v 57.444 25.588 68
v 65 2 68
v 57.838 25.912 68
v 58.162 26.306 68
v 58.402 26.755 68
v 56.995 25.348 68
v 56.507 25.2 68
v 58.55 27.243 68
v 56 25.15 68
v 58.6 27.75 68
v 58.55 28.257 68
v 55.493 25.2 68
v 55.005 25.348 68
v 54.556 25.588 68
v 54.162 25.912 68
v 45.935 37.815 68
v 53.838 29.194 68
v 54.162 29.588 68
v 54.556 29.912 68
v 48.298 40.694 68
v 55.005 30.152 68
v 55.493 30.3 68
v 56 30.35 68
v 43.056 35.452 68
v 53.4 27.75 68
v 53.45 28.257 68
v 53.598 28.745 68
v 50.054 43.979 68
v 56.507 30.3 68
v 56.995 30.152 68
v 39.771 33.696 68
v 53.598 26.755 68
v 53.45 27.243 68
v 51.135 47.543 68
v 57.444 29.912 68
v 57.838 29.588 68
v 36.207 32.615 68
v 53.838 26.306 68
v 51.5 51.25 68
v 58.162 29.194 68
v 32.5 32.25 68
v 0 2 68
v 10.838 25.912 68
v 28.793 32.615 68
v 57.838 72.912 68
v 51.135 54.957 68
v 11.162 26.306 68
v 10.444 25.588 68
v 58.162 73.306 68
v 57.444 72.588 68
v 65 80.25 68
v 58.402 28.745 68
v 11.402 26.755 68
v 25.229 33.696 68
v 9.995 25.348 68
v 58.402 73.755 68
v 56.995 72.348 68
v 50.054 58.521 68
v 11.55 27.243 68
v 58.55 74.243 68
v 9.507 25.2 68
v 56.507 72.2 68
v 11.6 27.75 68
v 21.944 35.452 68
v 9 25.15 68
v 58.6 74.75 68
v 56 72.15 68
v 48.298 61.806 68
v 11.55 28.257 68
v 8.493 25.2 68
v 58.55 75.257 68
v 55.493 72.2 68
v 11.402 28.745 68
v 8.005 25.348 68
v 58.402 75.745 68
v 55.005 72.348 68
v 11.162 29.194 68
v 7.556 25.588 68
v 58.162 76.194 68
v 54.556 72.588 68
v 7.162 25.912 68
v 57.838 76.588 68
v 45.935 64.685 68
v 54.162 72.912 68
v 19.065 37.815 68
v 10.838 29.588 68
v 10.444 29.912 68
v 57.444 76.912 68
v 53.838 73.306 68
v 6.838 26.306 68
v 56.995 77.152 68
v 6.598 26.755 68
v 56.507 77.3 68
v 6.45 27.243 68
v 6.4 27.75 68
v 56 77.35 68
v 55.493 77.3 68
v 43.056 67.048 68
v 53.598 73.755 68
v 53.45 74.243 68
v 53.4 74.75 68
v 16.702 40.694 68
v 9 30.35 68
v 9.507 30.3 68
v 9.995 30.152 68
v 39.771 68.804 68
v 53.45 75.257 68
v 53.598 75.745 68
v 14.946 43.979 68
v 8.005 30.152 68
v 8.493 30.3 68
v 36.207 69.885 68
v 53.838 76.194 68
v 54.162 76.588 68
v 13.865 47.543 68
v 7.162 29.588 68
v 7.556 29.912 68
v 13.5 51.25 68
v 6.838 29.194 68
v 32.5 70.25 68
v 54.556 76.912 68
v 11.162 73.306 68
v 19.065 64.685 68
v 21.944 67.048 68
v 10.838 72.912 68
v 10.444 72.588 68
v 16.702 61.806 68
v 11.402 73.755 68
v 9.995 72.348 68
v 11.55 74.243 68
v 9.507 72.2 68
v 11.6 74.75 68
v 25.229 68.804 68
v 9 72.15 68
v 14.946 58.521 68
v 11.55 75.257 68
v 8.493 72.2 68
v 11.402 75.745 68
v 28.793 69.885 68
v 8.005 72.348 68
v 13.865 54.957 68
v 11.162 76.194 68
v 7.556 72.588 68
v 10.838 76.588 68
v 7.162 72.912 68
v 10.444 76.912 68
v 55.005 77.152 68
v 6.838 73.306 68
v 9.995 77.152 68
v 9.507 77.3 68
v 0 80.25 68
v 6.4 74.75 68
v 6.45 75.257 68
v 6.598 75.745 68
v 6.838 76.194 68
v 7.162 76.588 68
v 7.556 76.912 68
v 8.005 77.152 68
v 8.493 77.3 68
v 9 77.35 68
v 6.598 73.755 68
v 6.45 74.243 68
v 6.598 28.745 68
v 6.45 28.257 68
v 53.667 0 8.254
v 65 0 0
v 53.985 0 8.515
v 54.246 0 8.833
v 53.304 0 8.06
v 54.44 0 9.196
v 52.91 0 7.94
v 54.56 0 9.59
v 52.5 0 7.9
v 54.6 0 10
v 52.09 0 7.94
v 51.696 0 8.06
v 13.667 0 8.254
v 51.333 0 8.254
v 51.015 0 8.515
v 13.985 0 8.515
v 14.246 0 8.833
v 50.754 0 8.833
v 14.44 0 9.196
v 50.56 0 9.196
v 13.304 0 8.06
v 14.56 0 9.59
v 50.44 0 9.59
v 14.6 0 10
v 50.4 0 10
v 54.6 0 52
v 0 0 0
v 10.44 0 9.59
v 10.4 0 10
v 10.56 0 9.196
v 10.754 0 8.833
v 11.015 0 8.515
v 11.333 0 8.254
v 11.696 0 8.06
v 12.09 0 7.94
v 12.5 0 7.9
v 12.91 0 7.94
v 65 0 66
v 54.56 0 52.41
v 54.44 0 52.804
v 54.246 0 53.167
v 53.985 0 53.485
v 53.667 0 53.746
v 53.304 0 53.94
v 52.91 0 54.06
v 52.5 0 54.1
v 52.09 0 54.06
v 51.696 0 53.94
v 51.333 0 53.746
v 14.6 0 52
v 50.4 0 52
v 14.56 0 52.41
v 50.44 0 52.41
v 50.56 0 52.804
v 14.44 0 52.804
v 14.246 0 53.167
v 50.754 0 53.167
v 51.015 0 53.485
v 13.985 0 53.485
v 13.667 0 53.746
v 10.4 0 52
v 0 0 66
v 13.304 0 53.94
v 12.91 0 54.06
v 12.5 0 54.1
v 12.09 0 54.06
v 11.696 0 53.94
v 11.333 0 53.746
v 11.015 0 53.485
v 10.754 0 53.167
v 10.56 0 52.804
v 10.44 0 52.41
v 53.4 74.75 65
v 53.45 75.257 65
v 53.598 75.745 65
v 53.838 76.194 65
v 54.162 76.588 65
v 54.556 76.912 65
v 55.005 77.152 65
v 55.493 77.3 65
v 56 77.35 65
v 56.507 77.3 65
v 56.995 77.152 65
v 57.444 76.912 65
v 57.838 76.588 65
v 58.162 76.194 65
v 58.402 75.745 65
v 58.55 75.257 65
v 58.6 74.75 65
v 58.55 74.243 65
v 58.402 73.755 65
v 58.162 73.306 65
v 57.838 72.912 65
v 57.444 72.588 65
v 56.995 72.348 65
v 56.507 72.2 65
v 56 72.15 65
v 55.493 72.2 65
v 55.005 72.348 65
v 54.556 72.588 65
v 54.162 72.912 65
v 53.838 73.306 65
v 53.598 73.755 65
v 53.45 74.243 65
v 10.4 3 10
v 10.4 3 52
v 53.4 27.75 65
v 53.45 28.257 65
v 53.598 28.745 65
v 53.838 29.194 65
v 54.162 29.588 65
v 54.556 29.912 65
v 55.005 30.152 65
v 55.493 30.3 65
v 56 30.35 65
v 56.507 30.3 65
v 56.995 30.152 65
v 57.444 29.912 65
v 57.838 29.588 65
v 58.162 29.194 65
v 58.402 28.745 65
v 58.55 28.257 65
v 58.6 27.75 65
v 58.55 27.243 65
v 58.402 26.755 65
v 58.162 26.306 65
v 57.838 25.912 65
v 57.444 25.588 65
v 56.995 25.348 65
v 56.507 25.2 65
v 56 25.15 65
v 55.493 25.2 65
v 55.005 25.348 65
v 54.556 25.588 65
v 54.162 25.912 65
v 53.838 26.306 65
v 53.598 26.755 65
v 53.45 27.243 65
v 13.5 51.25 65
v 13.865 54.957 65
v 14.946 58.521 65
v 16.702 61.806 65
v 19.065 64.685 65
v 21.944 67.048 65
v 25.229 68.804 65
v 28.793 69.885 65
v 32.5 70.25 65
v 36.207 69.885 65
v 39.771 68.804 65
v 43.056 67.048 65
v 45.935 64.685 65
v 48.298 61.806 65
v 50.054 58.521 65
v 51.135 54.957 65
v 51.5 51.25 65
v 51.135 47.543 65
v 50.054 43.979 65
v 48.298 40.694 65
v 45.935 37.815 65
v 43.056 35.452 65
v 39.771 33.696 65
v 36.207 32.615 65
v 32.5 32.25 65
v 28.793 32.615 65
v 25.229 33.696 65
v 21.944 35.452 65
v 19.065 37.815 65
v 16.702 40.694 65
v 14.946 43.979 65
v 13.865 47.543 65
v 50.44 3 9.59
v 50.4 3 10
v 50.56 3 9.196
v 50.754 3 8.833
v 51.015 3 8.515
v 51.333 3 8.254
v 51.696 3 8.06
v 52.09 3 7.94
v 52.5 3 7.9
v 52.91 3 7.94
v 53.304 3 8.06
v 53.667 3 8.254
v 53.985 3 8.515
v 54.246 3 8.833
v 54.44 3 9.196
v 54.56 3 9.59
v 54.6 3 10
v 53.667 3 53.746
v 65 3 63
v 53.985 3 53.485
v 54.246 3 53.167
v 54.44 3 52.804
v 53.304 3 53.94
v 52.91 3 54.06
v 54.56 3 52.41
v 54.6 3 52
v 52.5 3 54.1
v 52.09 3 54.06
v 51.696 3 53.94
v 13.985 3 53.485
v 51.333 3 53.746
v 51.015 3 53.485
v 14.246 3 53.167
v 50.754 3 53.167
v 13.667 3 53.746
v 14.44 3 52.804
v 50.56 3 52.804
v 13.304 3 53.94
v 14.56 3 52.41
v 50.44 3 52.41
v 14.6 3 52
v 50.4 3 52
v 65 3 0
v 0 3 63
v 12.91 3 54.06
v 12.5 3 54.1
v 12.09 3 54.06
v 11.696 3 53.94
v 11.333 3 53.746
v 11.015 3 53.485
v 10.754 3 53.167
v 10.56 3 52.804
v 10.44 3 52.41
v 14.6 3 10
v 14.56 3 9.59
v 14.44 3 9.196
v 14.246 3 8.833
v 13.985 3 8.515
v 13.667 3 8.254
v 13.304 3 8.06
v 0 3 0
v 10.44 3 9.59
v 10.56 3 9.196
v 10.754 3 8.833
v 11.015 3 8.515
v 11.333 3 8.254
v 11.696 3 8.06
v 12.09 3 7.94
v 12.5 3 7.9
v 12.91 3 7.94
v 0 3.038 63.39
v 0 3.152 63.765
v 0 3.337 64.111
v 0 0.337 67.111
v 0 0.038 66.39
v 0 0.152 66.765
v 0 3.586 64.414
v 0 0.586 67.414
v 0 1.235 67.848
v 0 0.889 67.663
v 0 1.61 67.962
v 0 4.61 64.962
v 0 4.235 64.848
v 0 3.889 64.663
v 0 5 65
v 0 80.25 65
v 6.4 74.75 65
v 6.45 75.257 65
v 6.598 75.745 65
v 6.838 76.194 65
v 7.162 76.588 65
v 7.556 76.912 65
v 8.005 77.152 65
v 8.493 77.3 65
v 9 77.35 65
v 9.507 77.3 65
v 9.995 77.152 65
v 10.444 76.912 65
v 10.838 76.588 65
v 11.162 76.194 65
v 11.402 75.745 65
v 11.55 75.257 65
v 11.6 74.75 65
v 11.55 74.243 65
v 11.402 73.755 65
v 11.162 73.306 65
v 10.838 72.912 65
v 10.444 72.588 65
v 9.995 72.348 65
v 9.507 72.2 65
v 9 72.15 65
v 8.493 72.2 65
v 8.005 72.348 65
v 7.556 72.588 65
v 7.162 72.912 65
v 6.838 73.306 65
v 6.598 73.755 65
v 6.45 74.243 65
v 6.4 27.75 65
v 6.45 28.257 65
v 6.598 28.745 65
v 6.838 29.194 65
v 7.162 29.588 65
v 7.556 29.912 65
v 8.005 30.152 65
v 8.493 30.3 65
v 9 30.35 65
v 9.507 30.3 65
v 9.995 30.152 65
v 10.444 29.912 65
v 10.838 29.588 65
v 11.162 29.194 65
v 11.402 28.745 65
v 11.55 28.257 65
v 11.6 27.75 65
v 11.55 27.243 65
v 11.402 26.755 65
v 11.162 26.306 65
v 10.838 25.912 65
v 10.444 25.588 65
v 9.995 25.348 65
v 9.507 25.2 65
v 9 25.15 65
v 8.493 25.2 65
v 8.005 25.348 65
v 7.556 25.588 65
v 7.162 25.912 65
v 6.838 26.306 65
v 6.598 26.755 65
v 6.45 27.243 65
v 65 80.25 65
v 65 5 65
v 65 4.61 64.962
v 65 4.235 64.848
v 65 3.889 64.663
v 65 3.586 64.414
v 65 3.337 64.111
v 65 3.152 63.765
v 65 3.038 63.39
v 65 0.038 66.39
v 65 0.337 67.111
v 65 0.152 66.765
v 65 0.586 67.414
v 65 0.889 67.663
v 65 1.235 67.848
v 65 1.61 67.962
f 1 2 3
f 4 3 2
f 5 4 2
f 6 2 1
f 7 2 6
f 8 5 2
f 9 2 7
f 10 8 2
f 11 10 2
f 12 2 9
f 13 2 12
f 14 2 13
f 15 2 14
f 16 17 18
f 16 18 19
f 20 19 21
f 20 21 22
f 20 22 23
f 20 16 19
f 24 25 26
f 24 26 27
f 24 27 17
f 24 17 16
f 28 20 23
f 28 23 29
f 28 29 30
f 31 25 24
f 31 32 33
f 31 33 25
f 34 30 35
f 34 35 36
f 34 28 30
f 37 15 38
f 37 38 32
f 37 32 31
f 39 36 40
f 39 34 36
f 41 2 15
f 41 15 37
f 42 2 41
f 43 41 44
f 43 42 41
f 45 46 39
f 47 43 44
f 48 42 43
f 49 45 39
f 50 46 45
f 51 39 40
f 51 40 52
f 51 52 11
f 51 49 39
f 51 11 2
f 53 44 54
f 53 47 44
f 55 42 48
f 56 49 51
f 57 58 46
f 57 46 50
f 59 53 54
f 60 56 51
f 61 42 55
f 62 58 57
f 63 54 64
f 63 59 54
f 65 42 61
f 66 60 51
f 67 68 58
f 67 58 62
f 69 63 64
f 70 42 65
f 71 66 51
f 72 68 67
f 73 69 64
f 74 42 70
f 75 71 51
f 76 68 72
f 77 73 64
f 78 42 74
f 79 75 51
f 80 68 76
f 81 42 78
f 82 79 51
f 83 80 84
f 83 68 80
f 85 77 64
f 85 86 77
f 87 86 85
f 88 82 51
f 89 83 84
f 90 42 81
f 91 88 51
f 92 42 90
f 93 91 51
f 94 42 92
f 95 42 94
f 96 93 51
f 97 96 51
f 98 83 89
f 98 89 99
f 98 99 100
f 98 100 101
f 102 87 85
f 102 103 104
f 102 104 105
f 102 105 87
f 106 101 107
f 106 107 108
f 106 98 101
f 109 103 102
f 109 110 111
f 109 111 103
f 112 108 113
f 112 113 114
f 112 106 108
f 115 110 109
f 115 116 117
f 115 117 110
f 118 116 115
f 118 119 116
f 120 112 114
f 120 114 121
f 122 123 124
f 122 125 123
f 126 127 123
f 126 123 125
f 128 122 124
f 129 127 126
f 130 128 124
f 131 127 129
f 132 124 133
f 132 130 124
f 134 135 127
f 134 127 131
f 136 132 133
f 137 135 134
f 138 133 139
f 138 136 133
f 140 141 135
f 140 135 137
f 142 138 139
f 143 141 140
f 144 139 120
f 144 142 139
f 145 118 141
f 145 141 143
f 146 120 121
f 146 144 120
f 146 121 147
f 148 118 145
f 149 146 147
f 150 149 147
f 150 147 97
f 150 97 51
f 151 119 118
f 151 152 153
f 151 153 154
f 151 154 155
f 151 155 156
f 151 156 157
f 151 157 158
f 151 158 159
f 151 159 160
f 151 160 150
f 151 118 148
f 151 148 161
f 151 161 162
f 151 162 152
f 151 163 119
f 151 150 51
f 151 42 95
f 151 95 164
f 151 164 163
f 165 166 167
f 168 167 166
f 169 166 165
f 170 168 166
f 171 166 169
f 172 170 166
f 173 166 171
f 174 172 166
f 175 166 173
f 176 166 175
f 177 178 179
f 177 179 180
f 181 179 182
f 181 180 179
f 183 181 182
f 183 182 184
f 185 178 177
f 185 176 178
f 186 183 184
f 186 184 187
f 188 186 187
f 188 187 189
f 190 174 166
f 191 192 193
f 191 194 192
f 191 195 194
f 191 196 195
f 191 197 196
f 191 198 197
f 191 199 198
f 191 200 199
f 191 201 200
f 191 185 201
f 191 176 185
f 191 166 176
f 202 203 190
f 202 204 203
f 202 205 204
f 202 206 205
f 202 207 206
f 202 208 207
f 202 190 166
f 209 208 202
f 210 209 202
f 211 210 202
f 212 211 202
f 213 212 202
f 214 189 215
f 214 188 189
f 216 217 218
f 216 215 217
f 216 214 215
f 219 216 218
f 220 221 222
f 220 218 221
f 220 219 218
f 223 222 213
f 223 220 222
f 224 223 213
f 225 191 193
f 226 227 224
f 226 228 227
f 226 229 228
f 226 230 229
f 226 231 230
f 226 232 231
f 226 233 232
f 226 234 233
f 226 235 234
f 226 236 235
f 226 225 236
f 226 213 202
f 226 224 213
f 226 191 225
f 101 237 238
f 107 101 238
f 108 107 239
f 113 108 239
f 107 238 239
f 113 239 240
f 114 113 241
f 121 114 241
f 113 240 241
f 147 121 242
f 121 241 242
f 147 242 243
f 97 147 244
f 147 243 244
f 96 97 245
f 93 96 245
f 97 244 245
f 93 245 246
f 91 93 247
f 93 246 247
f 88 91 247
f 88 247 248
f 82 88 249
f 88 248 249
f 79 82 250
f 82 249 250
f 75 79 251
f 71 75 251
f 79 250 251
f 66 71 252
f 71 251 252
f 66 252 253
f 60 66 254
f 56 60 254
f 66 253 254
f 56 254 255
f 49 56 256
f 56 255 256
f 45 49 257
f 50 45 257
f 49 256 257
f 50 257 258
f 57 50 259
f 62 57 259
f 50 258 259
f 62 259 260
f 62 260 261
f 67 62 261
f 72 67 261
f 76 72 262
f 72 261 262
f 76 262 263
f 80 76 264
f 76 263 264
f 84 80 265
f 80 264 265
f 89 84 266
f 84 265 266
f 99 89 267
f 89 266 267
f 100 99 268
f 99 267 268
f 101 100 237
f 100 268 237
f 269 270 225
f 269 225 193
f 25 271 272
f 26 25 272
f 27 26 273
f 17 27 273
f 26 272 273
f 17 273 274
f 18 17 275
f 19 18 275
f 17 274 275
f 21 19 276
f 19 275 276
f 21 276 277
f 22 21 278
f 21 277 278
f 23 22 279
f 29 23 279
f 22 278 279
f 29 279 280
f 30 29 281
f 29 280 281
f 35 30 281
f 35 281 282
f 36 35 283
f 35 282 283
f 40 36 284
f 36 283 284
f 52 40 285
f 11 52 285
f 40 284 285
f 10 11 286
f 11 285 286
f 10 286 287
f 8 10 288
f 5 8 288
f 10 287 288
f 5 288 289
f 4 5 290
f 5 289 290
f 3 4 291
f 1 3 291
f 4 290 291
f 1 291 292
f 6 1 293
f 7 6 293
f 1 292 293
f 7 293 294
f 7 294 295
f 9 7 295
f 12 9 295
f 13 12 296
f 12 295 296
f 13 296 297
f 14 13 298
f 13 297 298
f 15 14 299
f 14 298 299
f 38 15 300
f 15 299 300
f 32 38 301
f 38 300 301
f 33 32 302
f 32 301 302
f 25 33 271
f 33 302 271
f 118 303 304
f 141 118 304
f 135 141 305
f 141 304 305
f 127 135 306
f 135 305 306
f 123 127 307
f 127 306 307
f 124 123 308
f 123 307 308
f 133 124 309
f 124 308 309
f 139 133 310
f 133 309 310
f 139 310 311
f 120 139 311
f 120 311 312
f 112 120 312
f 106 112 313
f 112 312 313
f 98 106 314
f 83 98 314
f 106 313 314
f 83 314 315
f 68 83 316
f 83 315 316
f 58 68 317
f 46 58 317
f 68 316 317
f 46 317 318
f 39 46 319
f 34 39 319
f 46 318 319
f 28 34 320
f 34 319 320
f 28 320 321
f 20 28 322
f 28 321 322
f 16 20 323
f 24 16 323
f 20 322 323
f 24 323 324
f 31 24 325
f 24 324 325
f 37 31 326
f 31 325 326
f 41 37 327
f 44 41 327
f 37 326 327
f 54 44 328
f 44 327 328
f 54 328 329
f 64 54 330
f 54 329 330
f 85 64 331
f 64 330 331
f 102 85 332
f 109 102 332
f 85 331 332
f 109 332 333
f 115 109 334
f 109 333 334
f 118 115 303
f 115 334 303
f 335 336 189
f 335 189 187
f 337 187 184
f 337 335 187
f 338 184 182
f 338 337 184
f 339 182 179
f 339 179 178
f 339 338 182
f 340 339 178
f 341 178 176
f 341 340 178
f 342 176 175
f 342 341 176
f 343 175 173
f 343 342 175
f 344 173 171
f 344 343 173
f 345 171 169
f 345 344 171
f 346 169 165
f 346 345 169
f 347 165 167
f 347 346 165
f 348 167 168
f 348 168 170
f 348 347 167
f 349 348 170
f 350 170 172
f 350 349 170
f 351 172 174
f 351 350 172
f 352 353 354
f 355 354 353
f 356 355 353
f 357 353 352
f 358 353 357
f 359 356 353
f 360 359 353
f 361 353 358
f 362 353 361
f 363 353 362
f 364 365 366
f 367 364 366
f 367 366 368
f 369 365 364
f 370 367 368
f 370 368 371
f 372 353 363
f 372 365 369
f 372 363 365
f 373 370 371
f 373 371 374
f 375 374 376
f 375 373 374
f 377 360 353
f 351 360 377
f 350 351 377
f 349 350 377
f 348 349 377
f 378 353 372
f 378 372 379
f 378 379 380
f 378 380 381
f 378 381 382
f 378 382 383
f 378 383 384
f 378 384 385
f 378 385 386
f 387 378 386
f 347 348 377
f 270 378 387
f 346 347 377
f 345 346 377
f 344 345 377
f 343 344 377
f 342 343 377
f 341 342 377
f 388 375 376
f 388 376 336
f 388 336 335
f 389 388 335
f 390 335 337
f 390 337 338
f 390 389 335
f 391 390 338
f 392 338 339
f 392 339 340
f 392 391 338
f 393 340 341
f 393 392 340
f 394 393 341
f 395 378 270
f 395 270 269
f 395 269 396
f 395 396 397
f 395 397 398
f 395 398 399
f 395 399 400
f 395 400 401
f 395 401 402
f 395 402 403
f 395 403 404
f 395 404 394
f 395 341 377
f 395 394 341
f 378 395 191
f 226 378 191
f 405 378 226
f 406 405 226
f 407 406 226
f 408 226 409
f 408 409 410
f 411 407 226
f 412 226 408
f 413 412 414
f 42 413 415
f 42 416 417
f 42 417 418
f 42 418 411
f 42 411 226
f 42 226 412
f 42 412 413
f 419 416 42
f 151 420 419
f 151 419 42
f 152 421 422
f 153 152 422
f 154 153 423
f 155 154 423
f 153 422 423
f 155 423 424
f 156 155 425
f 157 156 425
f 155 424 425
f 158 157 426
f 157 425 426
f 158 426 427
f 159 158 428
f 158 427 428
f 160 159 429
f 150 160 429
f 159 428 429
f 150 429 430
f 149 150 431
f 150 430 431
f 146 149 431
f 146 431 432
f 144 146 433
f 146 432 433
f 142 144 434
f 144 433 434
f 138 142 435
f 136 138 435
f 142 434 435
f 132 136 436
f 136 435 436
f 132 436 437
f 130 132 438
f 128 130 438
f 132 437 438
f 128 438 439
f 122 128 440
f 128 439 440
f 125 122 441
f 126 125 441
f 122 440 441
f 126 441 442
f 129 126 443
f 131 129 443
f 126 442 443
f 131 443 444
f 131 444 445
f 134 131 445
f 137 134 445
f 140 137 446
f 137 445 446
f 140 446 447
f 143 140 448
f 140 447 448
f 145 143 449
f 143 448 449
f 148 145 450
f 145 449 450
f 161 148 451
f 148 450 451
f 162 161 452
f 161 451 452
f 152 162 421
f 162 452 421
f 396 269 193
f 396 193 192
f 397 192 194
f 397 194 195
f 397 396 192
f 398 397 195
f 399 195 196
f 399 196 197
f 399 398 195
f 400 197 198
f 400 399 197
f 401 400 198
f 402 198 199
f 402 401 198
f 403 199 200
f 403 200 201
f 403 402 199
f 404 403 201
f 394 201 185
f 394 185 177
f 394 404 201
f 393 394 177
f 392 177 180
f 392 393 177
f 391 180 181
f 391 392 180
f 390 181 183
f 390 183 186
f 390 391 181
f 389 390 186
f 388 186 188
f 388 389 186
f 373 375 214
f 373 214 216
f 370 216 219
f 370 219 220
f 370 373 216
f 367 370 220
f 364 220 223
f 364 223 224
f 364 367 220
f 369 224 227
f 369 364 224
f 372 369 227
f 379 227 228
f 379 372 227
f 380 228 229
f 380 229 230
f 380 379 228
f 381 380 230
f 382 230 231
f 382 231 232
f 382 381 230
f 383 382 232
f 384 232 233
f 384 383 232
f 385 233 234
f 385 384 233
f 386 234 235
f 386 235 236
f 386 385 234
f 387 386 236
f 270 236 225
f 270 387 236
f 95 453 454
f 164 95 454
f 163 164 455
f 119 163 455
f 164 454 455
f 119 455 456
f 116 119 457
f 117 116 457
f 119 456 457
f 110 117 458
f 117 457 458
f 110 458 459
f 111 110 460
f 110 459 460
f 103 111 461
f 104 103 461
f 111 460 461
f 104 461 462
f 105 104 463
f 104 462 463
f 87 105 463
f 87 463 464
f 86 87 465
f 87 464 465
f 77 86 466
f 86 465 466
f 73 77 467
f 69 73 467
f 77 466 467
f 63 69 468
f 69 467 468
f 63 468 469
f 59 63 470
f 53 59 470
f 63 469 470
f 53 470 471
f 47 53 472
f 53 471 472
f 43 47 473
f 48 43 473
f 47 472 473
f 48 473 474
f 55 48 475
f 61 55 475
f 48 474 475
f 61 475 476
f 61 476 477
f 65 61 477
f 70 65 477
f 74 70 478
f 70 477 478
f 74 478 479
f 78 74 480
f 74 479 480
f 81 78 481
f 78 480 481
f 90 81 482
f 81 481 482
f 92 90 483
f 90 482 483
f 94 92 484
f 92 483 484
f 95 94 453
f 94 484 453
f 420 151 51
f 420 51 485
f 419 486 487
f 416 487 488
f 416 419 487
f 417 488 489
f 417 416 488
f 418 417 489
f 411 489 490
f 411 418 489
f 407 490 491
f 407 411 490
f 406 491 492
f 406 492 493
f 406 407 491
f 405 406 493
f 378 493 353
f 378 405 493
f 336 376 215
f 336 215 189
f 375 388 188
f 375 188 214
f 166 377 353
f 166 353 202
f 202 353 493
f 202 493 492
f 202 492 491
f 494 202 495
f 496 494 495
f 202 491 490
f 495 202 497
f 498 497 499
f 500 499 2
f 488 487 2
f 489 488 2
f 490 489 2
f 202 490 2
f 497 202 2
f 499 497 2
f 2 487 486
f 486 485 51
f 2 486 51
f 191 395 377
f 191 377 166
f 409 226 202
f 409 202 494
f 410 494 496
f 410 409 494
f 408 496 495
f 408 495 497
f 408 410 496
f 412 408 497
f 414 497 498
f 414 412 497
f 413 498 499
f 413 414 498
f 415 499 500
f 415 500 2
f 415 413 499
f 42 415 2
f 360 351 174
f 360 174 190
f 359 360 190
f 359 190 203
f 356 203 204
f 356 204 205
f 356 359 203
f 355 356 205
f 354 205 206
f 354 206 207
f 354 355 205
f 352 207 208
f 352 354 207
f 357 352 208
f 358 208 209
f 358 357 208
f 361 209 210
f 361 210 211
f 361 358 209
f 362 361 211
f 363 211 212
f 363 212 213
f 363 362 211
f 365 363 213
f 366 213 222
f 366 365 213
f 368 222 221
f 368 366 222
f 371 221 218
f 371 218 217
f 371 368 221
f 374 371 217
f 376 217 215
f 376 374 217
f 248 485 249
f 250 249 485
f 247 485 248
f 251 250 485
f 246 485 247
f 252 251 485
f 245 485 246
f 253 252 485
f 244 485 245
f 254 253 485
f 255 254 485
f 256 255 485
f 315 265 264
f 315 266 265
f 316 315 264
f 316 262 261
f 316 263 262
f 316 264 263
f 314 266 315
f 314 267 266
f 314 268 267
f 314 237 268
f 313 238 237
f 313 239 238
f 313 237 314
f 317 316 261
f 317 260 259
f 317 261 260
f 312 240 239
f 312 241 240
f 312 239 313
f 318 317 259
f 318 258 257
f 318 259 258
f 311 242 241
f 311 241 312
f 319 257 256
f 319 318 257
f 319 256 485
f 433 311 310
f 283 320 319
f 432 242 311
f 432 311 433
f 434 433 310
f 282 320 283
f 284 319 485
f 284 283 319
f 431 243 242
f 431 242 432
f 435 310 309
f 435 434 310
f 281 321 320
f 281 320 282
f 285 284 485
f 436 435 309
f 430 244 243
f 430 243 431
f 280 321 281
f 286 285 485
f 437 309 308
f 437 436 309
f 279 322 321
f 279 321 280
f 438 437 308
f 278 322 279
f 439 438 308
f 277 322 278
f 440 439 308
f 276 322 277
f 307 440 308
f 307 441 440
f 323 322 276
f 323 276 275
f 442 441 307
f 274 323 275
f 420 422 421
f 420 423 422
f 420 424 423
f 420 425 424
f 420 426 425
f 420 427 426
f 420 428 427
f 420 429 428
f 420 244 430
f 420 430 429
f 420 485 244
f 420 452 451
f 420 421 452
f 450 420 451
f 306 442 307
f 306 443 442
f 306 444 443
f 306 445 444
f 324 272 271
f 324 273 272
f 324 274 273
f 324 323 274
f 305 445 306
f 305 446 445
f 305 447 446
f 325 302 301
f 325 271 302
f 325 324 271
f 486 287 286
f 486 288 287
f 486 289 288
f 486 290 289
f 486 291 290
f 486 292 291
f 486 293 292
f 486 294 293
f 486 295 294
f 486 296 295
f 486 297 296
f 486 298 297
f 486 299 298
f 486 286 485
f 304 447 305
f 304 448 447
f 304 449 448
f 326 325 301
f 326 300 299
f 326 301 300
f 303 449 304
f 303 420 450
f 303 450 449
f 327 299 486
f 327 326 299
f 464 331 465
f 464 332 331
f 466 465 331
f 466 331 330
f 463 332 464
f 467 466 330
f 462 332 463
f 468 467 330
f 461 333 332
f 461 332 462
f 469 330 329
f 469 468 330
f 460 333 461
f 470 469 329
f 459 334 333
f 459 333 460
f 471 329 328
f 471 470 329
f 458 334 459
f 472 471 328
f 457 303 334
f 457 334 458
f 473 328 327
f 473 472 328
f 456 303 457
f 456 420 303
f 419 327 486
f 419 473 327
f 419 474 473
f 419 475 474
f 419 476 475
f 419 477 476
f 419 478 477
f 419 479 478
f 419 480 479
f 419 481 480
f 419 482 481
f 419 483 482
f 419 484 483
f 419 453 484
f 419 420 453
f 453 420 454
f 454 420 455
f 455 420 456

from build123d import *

# Parameters (mm, degrees)
BODY_DEPTH         = 65
CUT_EXTRUDE1_DEPTH = 3
SKETCH5_R          = 19
SKETCH5_R_2        = 2.6
CUT_EXTRUDE2_DEPTH = 3


with BuildPart() as part:
    # Sketch1 → Body (new body)
    with BuildSketch(Plane(origin=(0, 0, 0), x_dir=(0, 0, -1), z_dir=(1, 0, 0))):
        with BuildLine():
            Line((0, 0), (-66, 0))
            ThreePointArc((-66, 0), (-67.414213562, 0.585786438), (-68, 2))
            Line((-68, 2), (-68, 80.25))
            Line((-68, 80.25), (-65, 80.25))
            Line((-65, 80.25), (-65, 5))
            ThreePointArc((-65, 5), (-64.414213562, 3.585786438), (-63, 3))
            Line((-63, 3), (0, 3))
            Line((0, 3), (0, 0))
        make_face()
    extrude(amount=BODY_DEPTH)

    # Sketch4 → Cut-Extrude1 (cut)
    with BuildSketch(Plane(origin=(0, 3, 0), x_dir=(1, 0, 0), z_dir=(0, 1, 0))):
        with BuildLine():
            Line((50.4, -52), (50.4, -10))
            ThreePointArc((50.4, -10), (52.5, -7.9), (54.6, -10))
            Line((54.6, -10), (54.6, -52))
            ThreePointArc((54.6, -52), (52.5, -54.1), (50.4, -52))
        make_face()
        with BuildLine():
            Line((10.4, -52), (10.4, -10))
            ThreePointArc((10.4, -10), (12.5, -7.9), (14.6, -10))
            Line((14.6, -10), (14.6, -52))
            ThreePointArc((14.6, -52), (12.5, -54.1), (10.4, -52))
        make_face()
    extrude(amount=-CUT_EXTRUDE1_DEPTH, mode=Mode.SUBTRACT)

    # Sketch5 → Cut-Extrude2 (cut)
    with BuildSketch(Plane(origin=(0, 0, 65), x_dir=(-1, 0, 0), z_dir=(0, 0, -1))):
        with Locations((-32.5, 51.25)):
            Circle(SKETCH5_R)
        with Locations((-9, 74.75)):
            Circle(SKETCH5_R_2)
        with Locations((-56, 74.75)):
            Circle(SKETCH5_R_2)
        with Locations((-56, 27.75)):
            Circle(SKETCH5_R_2)
        with Locations((-9, 27.75)):
            Circle(SKETCH5_R_2)
    extrude(amount=-CUT_EXTRUDE2_DEPTH, mode=Mode.SUBTRACT)


solid = part.part
